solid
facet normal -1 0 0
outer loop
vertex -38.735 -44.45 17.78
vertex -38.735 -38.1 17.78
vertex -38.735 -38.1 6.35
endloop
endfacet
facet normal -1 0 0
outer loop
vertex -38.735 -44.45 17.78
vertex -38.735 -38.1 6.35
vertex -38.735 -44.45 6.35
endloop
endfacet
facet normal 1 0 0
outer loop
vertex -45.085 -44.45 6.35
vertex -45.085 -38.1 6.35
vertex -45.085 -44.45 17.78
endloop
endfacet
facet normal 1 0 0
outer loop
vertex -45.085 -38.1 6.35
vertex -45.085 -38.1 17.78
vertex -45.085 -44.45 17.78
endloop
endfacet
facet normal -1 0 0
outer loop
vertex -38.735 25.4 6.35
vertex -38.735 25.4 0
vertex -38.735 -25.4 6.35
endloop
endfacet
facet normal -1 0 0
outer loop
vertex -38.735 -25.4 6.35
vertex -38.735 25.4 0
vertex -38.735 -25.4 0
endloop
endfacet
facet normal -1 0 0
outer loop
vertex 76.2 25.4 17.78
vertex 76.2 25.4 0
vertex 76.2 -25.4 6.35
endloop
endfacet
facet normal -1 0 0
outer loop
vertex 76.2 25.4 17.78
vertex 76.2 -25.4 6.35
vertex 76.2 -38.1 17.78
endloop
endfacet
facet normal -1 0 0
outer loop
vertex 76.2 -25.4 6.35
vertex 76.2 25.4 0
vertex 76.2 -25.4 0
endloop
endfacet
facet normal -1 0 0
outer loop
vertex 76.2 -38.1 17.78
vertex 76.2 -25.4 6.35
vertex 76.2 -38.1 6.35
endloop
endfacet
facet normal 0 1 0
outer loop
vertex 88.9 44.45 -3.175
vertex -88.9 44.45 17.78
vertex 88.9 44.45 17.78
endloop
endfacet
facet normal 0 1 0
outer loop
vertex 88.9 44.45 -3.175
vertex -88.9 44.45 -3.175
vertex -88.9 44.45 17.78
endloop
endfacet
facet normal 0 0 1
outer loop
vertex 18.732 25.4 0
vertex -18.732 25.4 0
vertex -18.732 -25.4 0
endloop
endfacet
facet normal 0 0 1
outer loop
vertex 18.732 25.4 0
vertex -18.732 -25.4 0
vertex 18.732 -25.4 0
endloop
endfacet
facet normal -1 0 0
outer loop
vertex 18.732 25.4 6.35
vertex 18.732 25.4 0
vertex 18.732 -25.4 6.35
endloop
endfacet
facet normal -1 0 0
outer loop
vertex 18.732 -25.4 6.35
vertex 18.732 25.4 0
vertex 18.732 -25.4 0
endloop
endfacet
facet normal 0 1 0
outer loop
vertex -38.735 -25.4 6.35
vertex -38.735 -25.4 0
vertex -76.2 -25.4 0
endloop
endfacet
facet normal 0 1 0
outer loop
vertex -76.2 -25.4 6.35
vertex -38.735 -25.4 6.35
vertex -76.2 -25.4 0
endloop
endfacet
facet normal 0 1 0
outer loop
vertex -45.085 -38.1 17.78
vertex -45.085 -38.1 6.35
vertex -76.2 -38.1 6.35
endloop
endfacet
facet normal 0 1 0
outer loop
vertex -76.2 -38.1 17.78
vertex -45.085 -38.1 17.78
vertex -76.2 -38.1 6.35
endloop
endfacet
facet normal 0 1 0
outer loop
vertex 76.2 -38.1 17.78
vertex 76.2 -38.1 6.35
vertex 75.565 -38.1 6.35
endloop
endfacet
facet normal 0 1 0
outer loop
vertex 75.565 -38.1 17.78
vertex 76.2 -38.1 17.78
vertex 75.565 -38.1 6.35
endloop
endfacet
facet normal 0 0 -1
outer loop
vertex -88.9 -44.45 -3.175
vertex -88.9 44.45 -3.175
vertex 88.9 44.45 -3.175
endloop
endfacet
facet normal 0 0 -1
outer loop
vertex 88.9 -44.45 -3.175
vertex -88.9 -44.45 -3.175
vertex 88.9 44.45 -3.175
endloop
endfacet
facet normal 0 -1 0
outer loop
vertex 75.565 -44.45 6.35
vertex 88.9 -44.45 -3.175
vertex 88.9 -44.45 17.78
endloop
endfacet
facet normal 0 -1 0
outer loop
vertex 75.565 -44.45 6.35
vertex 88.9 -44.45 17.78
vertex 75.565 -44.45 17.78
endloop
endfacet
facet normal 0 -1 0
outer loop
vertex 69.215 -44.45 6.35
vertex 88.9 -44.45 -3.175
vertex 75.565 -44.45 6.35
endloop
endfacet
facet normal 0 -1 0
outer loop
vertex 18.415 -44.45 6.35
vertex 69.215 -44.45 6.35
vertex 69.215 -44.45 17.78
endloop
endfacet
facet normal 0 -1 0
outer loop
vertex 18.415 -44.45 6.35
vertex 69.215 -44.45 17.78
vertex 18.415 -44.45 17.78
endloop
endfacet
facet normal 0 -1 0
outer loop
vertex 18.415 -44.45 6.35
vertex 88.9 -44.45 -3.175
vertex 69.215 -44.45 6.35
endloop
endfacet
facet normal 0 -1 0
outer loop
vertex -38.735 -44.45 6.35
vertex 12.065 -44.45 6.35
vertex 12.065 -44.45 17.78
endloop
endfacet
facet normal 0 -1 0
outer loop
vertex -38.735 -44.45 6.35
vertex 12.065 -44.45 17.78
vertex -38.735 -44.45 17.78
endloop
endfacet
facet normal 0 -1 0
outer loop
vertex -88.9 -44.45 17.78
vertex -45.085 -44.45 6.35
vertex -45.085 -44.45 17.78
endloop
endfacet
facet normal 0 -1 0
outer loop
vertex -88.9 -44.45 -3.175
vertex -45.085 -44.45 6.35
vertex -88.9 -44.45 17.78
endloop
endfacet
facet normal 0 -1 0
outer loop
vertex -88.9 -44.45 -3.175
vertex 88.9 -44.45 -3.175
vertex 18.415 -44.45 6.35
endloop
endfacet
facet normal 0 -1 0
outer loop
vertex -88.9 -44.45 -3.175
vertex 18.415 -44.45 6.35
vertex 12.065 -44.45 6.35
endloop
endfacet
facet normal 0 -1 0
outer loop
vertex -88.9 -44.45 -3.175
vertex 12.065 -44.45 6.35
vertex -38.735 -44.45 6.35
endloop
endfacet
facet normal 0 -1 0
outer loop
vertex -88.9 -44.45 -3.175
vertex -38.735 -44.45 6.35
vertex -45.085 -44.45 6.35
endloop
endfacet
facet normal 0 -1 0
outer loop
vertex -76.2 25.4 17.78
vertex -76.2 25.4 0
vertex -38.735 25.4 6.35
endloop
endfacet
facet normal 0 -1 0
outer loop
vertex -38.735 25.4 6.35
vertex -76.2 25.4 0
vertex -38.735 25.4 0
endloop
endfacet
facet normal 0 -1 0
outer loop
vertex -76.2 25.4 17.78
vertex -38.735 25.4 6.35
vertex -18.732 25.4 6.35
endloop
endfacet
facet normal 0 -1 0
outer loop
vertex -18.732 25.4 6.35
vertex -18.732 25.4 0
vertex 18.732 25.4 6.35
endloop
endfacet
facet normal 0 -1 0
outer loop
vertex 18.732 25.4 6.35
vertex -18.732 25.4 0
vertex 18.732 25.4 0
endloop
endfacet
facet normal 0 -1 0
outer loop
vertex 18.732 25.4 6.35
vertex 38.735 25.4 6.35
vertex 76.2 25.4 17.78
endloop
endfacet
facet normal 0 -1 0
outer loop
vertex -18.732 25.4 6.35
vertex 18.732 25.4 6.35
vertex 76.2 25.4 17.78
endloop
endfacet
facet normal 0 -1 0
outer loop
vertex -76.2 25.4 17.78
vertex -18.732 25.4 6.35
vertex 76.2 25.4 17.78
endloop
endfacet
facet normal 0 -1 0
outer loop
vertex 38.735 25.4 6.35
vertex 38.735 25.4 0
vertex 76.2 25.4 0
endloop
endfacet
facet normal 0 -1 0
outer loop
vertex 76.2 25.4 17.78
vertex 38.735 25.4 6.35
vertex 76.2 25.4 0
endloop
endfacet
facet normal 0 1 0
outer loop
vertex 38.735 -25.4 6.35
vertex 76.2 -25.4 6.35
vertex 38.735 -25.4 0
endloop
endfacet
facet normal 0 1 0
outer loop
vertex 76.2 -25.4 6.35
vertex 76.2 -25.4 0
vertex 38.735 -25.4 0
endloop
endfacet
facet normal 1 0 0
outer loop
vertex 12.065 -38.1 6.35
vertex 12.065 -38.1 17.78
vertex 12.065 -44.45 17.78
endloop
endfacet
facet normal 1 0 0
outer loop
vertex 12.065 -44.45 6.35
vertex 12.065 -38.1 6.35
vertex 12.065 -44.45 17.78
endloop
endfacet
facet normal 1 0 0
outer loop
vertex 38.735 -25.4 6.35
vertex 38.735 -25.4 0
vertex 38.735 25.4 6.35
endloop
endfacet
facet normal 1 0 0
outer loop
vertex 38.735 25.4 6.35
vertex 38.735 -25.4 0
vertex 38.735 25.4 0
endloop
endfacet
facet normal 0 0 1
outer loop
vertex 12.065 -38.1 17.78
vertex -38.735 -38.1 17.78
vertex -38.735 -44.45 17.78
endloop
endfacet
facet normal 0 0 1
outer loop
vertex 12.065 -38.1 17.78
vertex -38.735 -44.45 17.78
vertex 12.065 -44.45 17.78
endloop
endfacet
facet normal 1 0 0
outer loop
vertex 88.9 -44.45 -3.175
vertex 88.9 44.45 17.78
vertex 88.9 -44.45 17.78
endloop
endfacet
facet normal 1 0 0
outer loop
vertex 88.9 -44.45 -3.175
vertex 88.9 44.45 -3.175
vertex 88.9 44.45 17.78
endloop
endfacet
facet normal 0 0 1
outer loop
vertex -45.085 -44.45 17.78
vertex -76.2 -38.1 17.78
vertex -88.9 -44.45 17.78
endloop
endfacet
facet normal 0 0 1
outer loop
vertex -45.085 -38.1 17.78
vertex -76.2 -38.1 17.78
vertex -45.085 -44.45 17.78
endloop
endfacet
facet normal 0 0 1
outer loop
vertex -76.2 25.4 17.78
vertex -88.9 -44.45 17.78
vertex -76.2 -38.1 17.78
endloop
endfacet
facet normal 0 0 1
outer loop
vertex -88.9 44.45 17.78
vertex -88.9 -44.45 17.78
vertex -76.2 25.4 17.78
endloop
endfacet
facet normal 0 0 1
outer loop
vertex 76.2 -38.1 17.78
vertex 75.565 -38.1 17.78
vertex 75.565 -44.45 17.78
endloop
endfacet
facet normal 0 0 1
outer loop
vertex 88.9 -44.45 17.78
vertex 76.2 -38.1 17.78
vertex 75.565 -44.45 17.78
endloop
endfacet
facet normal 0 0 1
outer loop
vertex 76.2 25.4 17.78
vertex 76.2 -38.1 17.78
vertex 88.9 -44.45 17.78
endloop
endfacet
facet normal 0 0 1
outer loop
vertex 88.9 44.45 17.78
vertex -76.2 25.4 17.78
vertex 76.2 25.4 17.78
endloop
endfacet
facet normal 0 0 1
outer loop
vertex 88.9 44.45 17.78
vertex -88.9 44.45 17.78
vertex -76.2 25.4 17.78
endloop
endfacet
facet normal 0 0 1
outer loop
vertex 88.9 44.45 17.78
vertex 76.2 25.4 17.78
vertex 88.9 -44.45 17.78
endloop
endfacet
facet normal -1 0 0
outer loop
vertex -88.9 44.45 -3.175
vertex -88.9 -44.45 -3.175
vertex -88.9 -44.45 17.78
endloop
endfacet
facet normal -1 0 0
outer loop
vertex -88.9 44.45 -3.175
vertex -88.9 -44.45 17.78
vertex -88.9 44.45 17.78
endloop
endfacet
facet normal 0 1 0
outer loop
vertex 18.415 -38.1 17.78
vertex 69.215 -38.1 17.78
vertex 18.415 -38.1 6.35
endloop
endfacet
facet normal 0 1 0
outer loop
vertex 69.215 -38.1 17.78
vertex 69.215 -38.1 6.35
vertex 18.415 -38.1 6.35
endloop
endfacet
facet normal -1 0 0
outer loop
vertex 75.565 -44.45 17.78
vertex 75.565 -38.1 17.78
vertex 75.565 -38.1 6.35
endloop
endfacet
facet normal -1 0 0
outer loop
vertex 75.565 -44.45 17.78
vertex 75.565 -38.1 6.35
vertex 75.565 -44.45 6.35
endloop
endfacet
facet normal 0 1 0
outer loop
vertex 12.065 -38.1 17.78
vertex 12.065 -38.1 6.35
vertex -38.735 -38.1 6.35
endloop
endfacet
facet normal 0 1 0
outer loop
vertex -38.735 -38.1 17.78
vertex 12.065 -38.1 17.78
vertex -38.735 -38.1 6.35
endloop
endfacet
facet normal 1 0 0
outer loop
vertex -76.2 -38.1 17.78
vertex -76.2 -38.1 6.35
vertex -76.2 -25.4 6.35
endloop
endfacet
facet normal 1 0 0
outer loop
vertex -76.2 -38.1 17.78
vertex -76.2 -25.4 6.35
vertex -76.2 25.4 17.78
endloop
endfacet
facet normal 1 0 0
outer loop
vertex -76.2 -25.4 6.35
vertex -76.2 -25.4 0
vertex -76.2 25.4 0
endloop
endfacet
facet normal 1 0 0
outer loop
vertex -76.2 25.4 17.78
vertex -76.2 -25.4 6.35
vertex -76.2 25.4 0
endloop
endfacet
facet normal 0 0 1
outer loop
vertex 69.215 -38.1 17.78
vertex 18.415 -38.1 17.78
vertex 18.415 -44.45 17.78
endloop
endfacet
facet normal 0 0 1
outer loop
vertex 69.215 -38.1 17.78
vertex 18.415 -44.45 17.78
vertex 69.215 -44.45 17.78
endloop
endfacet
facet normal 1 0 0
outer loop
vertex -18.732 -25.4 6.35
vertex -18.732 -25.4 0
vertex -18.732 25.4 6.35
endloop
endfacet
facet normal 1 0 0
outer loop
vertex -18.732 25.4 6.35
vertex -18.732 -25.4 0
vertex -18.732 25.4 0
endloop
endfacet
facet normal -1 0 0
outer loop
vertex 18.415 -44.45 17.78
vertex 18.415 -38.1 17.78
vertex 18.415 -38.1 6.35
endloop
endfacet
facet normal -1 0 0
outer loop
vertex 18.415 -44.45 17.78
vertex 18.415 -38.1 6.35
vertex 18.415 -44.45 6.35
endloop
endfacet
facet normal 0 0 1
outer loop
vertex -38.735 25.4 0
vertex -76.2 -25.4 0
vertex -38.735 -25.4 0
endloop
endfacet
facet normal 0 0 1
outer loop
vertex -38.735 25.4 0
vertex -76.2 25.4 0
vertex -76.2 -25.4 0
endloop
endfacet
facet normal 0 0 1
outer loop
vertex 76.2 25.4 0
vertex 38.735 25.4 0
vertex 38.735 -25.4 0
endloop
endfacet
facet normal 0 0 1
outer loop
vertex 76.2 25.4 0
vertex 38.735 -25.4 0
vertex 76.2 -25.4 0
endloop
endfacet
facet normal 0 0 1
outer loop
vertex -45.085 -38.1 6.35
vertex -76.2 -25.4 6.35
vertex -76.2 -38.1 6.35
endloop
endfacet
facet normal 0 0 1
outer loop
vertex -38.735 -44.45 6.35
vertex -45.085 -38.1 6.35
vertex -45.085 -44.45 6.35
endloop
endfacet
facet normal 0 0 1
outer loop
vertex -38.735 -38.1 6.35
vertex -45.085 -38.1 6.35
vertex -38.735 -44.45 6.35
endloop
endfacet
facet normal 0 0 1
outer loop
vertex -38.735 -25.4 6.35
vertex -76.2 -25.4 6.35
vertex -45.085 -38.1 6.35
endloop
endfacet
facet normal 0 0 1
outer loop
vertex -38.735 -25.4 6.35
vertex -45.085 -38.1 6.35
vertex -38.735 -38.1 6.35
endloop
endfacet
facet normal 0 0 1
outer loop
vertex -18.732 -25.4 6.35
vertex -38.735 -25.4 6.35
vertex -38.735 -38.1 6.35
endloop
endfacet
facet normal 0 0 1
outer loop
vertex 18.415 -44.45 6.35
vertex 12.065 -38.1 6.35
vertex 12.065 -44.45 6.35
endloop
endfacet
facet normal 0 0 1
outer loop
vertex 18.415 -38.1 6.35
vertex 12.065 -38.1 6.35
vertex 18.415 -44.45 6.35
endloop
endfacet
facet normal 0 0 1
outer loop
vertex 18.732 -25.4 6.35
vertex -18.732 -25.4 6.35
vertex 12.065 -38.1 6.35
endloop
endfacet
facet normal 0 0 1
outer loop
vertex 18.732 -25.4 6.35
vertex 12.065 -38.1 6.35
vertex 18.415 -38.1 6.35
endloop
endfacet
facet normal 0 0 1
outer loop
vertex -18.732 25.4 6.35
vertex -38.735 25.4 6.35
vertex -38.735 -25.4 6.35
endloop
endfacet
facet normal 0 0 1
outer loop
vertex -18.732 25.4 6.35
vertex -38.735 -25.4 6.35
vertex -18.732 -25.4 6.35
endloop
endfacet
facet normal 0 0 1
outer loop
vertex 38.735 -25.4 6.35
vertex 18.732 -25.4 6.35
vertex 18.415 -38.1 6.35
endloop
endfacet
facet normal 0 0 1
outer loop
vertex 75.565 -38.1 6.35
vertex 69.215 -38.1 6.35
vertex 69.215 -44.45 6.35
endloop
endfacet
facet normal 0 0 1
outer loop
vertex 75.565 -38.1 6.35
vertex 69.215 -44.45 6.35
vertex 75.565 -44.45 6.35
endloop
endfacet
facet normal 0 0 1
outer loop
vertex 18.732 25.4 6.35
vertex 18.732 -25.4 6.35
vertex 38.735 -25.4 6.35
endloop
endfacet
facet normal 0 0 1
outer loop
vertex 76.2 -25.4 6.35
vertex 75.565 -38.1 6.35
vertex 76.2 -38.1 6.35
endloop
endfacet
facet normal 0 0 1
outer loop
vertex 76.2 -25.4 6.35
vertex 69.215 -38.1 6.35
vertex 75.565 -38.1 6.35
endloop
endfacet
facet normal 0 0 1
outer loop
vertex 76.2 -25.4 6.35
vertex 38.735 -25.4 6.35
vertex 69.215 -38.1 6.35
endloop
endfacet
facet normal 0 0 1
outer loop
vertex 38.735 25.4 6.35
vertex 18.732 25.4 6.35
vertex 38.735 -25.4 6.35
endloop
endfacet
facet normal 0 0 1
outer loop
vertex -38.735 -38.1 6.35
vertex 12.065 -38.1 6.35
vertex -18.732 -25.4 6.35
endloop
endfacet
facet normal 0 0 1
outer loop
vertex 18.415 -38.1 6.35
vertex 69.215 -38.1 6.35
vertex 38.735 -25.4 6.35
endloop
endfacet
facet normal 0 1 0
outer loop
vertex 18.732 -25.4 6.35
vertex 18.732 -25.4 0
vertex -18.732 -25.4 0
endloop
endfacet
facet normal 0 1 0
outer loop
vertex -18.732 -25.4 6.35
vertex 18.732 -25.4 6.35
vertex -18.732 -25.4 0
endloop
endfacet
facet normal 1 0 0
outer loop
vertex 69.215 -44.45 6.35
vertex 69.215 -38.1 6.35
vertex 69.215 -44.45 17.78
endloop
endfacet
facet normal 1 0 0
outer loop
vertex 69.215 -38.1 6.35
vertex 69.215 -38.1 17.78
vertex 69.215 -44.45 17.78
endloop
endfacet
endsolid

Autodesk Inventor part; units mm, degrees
ref_plane "YZ Plane" through (0, 0, 0) normal (1, 0, 0) x (0, 1, 0)
ref_plane "XZ Plane" through (0, 0, 0) normal (0, 1, 0) x (-1, 0, 0)
ref_plane "XY Plane" through (0, 0, 0) normal (0, 0, 1) x (1, 0, 0)
sketch "Sketch1" plane through (0, 0, 0) normal (0, 0, 1) x (1, 0, 0)
  line L0 (88.9, -44.45) -> (-88.9, -44.45)
  line L1 (-88.9, -44.45) -> (-88.9, 44.45)
  line L2 (-88.9, 44.45) -> (88.9, 44.45)
  line L3 (88.9, 44.45) -> (88.9, -44.45)
  line L4 (88.9, -44.45) -> (-88.9, 44.45) construction
  line L5 (-88.9, -44.45) -> (88.9, 44.45) construction
  line L6 (-38.735, -25.4) -> (-76.2, -25.4)
  line L7 (-76.2, -25.4) -> (-76.2, 25.4)
  line L8 (-76.2, 25.4) -> (-38.735, 25.4)
  line L9 (-38.735, 25.4) -> (-38.735, -25.4)
  line L10 (-38.735, -25.4) -> (-76.2, 25.4) construction
  line L11 (-76.2, -25.4) -> (-38.735, 25.4) construction
  line L12 (18.7325, -25.4) -> (-18.7325, -25.4)
  line L13 (-18.7325, -25.4) -> (-18.7325, 25.4)
  line L14 (-18.7325, 25.4) -> (18.7325, 25.4)
  line L15 (18.7325, 25.4) -> (18.7325, -25.4)
  line L16 (18.7325, -25.4) -> (-18.7325, 25.4) construction
  line L17 (-18.7325, -25.4) -> (18.7325, 25.4) construction
  line L18 (76.2, -25.4) -> (38.735, -25.4)
  line L19 (38.735, -25.4) -> (38.735, 25.4)
  line L20 (38.735, 25.4) -> (76.2, 25.4)
  line L21 (76.2, 25.4) -> (76.2, -25.4)
  line L22 (76.2, -25.4) -> (38.735, 25.4) construction
  line L23 (38.735, -25.4) -> (76.2, 25.4) construction
  line L24 (-38.735, 25.4) -> (-38.735, -25.4)
  line L25 (-38.735, -25.4) -> (-18.7325, -25.4)
  line L26 (-18.7325, -25.4) -> (-18.7325, 25.4)
  line L27 (-18.7325, 25.4) -> (-38.735, 25.4)
  line L28 (18.7325, 25.4) -> (18.7325, -25.4)
  line L29 (18.7325, -25.4) -> (38.735, -25.4)
  line L30 (38.735, -25.4) -> (38.735, 25.4)
  line L31 (38.735, 25.4) -> (18.7325, 25.4)
  line L32 (-76.2, -25.4) -> (76.2, -25.4)
  line L33 (76.2, -25.4) -> (76.2, -38.1)
  line L34 (76.2, -38.1) -> (-76.2, -38.1)
  line L35 (-76.2, -38.1) -> (-76.2, -25.4)
  point P0 (0, 0)
  point P1 (-57.4675, 0)
  point P2 (-57.4675, 0)
  point P3 (0, 0)
  point P4 (57.4675, 0)
  point P5 (0, 0)
  point P6 (57.4675, 0)
  dimension "d0" = 177.8
  dimension "d1" = 88.9
  dimension "d2" = 37.465
  dimension "d3" = 50.8
  dimension "d4" = 12.7
  dimension "d5" = 12.7
  dimension "d6" = 12.7
extrude "Extrusion1" add sketch "Sketch1" along normal blind 17.78
extrude "Extrusion2" add sketch "Sketch1" against normal blind 3.175 contours L0 L1 L2 L3 | L25 L12 L29 L18 L33 L34 L35 L6 | L6 L7 L8 L9 | L9 L27 L13 L25 | L13 L14 L15 L12 | L15 L31 L19 L29 | L19 L20 L21 L18
extrude "Extrusion3" add sketch "Sketch1" along normal blind 6.35 contours L25 L12 L29 L18 L33 L34 L35 L6 | L9 L27 L13 L25 | L15 L31 L19 L29
sketch "Sketch2" plane through (0, 0, 17.78) normal (0, 0, 1) x (1, 0, 0)
  line L0 (-38.735, -25.4) -> (-76.2, -25.4) projected
  line L1 (-38.735, -25.4) -> (-38.735, -44.45)
  line L2 (88.9, -44.45) -> (-88.9, -44.45) projected
  line L3 (-38.735, -44.45) -> (-45.085, -44.45)
  line L4 (76.2, -38.1) -> (-76.2, -38.1) projected
  line L5 (-45.085, -38.1) -> (-45.085, -44.45)
  line L6 (-45.085, -38.1) -> (-38.735, -38.1)
  point P0 (0, 0)
  dimension "d13" = 6.35
extrude "Extrusion4" cut sketch "Sketch2" against normal up to surface (11.43 mm away)
pattern_linear "Rectangular Pattern1" count 3 spacing 57.15 along (1, 0, 0) of "Extrusion4"
equation "\"d5\" = d4"
